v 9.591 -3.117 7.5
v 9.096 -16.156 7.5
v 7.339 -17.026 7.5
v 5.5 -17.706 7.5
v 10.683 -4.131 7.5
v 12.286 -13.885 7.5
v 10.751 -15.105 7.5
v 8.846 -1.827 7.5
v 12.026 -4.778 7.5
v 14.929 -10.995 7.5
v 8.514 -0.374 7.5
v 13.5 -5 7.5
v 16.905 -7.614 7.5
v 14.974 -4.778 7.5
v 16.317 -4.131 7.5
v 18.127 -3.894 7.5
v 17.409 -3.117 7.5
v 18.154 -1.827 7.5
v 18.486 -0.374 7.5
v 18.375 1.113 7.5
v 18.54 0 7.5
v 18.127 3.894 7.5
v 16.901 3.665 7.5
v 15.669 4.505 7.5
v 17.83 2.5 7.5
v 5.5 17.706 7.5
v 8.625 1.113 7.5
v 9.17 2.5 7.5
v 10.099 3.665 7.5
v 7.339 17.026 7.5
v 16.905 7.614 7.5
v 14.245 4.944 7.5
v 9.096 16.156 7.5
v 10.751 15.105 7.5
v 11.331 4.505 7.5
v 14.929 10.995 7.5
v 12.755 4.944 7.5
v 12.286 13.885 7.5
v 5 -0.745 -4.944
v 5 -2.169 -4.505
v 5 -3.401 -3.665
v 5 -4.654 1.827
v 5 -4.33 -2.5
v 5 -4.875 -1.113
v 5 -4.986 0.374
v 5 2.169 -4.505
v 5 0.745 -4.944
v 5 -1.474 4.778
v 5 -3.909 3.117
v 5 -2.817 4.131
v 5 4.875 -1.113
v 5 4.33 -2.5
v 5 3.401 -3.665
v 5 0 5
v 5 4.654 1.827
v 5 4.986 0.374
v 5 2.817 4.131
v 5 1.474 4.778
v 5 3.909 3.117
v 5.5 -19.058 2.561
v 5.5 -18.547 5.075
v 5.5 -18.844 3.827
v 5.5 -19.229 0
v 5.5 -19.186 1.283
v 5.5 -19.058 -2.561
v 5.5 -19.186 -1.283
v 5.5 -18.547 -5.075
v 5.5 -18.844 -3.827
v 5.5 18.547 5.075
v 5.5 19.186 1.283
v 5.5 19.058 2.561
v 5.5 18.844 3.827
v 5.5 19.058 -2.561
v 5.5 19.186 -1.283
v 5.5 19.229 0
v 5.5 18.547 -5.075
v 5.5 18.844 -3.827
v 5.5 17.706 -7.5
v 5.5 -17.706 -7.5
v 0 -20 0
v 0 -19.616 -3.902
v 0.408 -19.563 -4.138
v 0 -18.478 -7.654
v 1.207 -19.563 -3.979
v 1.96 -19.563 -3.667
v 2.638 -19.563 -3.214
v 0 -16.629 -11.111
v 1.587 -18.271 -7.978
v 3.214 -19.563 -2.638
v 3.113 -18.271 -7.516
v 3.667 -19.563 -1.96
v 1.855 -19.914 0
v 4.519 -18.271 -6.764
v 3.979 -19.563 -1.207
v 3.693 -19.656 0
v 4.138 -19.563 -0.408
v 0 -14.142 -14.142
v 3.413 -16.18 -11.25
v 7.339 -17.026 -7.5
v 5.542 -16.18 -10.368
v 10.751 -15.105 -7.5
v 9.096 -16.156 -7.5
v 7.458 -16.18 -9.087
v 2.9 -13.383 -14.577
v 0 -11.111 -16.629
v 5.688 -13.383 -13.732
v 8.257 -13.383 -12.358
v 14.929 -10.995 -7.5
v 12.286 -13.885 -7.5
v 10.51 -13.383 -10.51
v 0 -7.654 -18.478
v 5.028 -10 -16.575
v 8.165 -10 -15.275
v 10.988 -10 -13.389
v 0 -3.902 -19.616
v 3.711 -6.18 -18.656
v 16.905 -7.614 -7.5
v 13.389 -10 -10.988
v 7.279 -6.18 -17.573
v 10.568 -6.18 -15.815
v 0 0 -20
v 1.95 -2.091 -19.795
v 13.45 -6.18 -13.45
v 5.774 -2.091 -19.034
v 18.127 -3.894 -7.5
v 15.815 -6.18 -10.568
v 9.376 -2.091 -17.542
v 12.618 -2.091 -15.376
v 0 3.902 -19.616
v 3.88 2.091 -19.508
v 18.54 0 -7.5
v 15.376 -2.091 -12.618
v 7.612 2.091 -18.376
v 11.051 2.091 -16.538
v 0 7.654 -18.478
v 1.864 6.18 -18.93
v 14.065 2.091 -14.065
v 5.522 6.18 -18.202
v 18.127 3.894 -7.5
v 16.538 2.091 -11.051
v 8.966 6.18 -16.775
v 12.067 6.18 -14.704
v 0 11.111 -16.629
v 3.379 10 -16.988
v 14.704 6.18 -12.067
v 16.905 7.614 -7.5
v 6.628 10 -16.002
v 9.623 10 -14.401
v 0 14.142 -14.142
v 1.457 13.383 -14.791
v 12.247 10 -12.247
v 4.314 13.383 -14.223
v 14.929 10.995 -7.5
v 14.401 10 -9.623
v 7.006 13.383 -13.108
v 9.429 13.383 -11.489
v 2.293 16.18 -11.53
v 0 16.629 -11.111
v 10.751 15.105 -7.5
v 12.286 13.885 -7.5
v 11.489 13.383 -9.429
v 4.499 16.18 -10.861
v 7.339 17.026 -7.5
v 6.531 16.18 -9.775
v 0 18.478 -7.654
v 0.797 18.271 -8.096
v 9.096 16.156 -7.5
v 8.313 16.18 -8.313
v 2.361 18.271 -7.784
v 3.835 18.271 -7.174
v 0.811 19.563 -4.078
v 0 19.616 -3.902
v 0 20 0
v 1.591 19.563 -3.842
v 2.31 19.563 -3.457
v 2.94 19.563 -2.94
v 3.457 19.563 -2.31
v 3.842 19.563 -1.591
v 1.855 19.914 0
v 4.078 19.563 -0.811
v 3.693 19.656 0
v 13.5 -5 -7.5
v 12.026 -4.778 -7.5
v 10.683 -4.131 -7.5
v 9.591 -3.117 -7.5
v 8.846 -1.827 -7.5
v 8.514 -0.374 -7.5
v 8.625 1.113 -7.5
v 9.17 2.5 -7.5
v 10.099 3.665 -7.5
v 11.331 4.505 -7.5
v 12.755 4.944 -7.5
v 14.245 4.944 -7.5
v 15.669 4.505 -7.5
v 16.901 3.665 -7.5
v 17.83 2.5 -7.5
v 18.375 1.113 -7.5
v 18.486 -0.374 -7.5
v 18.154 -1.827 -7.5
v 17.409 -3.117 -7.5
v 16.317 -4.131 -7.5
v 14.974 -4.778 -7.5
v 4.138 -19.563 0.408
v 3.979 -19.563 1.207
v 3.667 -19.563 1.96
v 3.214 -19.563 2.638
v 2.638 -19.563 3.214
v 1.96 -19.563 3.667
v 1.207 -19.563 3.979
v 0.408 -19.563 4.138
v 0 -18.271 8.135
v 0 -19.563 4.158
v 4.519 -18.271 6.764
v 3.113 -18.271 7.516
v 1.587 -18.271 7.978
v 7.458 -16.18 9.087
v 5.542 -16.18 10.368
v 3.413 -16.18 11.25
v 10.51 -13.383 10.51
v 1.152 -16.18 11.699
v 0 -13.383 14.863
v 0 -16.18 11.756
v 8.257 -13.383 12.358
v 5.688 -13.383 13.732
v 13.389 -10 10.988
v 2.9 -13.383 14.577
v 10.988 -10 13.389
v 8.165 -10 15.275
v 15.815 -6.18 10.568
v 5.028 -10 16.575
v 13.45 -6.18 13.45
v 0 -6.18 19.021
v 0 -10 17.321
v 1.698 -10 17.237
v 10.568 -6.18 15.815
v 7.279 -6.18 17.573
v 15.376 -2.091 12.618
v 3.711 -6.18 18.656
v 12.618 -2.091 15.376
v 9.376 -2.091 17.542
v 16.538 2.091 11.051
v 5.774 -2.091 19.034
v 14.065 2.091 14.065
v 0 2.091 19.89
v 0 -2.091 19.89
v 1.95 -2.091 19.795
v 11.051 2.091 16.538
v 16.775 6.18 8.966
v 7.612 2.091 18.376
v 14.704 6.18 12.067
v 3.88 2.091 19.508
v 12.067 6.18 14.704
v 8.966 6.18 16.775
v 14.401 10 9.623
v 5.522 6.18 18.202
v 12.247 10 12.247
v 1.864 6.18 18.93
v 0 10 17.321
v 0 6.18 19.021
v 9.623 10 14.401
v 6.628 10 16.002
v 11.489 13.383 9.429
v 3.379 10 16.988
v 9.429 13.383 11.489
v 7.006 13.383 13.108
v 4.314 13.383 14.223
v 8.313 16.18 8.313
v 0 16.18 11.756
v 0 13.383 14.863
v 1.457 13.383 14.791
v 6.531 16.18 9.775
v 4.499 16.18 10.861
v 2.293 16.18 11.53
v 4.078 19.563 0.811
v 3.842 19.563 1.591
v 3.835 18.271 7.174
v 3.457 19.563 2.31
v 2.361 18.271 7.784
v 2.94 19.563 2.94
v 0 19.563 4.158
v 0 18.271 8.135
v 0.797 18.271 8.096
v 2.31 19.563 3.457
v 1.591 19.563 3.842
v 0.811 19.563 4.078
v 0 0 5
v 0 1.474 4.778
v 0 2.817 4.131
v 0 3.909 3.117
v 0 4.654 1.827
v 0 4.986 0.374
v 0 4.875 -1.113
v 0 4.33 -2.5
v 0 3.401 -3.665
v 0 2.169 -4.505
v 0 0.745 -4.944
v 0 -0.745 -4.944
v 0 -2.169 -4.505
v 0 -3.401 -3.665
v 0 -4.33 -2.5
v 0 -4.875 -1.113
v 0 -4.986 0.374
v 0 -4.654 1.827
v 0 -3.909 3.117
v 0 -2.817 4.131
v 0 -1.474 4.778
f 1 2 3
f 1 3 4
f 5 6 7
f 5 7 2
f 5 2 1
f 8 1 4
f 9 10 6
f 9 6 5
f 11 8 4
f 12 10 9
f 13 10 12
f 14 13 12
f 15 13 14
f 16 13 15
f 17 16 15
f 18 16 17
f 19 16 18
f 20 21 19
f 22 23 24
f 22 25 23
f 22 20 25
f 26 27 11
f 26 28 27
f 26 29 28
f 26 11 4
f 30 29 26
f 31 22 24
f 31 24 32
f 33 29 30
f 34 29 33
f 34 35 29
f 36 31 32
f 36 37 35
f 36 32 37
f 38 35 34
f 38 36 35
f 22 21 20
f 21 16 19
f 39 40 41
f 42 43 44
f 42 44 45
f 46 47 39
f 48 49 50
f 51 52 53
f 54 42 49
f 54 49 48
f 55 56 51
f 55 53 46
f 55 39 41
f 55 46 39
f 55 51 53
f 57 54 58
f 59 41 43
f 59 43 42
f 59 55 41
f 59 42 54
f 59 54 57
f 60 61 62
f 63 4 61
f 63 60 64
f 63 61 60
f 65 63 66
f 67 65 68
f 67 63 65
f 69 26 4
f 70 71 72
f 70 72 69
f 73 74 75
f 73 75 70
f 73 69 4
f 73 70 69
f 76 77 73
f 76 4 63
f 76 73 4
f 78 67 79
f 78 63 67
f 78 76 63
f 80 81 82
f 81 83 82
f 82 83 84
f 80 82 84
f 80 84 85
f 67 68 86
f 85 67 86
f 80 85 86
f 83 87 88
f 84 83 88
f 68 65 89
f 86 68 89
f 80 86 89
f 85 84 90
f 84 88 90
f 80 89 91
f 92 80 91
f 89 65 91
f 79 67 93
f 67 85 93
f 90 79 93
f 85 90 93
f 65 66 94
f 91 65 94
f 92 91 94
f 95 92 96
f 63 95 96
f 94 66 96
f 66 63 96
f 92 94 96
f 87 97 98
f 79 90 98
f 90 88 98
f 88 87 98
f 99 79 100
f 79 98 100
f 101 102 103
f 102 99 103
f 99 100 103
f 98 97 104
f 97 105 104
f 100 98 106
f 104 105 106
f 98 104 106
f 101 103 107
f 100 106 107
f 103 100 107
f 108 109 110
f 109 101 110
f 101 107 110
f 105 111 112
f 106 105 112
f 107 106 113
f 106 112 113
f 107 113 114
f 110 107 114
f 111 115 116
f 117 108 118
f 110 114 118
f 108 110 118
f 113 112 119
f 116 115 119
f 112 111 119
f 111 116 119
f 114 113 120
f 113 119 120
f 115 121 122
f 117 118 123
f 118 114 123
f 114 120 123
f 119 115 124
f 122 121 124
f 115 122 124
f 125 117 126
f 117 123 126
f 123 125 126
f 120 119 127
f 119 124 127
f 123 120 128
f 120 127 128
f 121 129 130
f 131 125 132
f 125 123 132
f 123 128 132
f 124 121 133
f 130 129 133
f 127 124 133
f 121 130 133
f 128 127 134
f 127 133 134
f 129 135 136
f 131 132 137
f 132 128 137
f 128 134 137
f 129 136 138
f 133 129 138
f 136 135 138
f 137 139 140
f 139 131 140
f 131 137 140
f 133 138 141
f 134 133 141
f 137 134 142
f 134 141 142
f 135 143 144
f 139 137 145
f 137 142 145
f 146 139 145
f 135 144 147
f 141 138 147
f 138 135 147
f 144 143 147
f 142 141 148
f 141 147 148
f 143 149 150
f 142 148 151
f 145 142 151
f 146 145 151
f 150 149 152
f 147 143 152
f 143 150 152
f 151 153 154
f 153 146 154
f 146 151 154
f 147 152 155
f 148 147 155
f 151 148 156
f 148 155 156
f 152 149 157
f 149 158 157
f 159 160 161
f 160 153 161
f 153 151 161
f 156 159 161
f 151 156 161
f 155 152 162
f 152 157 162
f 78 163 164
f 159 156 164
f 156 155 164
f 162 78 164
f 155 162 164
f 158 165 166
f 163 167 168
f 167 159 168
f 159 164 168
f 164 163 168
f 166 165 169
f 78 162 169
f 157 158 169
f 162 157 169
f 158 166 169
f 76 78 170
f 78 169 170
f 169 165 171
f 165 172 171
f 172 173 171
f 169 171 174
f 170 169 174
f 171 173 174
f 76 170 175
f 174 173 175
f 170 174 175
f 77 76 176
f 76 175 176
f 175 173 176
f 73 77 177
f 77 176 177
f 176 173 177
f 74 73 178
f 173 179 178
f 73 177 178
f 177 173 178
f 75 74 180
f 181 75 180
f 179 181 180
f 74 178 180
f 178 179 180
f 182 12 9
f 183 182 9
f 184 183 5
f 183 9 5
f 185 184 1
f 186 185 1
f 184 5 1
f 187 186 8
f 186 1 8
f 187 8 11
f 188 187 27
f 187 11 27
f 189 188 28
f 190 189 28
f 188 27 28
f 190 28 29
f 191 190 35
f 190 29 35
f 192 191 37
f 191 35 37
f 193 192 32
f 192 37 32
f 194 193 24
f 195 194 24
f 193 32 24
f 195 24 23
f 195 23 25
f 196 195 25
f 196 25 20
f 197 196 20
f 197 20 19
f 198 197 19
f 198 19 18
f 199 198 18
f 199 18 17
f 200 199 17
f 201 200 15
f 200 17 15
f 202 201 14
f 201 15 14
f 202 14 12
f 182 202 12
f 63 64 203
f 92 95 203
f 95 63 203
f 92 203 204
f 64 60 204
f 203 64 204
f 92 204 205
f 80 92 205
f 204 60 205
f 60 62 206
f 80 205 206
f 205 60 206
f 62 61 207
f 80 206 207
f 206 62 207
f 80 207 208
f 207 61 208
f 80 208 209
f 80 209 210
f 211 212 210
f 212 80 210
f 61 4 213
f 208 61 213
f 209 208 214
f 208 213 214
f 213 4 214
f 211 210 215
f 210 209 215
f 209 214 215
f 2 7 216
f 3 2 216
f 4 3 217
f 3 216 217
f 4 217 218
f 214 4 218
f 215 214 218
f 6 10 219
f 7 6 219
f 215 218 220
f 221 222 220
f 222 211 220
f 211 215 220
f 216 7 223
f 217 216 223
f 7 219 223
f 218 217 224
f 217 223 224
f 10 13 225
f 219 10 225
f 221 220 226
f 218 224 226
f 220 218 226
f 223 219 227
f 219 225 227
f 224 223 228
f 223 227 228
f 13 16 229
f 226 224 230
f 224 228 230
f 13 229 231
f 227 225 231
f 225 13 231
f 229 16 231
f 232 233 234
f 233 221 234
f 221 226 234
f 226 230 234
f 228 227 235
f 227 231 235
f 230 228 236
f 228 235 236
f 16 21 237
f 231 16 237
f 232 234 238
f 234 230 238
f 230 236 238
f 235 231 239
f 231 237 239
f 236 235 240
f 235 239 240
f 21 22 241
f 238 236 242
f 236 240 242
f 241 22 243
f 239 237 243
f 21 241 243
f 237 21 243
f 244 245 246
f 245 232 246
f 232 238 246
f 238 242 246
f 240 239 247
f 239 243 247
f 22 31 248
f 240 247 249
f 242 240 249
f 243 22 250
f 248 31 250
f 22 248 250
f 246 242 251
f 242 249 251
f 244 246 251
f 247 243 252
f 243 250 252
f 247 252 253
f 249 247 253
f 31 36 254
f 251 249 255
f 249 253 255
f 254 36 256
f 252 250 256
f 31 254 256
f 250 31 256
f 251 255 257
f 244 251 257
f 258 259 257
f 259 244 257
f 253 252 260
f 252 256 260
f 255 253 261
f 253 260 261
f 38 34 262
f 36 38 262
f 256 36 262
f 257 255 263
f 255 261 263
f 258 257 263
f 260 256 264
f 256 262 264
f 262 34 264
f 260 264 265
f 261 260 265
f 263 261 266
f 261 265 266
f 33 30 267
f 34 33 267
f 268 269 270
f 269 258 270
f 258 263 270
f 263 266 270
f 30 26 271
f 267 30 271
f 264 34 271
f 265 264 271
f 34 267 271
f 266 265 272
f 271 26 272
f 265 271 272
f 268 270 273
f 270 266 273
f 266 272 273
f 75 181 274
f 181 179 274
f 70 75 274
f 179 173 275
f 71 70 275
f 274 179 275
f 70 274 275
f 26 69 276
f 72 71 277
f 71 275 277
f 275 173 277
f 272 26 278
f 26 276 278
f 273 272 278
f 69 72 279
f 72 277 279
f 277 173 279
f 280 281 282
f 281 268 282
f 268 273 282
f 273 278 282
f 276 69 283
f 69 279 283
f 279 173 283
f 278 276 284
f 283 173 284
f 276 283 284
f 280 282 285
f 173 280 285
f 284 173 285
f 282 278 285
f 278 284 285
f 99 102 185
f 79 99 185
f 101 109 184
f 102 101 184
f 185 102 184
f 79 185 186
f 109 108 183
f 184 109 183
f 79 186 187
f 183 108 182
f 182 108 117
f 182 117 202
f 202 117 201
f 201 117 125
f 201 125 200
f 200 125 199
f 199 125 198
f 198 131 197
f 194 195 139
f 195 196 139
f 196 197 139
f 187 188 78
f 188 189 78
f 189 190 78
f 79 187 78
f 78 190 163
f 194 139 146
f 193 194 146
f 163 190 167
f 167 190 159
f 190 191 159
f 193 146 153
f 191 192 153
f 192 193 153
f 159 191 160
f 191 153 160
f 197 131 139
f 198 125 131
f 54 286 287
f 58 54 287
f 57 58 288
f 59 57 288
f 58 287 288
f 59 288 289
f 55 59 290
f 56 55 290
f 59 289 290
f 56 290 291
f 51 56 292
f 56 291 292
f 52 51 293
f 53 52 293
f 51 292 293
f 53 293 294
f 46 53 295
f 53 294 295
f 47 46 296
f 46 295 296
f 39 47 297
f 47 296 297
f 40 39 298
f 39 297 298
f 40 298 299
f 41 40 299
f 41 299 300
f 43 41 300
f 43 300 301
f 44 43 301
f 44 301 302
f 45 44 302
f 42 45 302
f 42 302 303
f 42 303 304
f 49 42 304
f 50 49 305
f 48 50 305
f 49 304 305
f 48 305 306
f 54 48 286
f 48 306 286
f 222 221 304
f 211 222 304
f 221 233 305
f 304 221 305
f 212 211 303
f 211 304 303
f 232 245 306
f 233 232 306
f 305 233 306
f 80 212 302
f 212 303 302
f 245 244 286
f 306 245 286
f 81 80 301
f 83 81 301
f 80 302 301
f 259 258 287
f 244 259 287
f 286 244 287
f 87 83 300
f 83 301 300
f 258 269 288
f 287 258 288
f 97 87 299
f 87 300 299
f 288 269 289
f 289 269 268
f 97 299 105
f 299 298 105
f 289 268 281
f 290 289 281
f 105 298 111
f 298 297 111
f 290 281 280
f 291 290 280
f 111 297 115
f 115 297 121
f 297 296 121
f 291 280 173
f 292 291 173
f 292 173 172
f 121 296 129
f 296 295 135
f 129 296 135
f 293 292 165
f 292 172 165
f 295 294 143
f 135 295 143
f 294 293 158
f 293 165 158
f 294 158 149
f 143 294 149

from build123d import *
from build123d.topology import SkipClean

# Parameters (mm, degrees)
SKETCH2_R           = 20
CUT_EXTRUDE1_DEPTH  = 30
SKETCH9_W           = 15
SKETCH9_H           = 41
CUT_EXTRUDE4_DEPTH  = 14.5
SKETCH10_R          = 5
BOSS_EXTRUDE2_DEPTH = 15
SKETCH11_R          = 5
CUT_EXTRUDE5_DEPTH  = 5


with BuildPart() as part:
    # Sketch3 → Revolve1 (revolve)
    with BuildSketch(Plane.XY):
        with BuildLine():
            Line((0, 20), (0, -20))
            ThreePointArc((0, -20), (20, 0), (0, 20))
        make_face()
    revolve(axis=Axis((0, 20, 0), (0, -1, 0)))

    # Sketch2 → Cut-Extrude1 (cut)
    with SkipClean():  # the faces are left unmerged after this step: merging them gives an invalid solid
        with BuildSketch(Plane(origin=(0, 0, 0), x_dir=(0, 0, -1), z_dir=(1, 0, 0))):
            Circle(SKETCH2_R)
        extrude(amount=-CUT_EXTRUDE1_DEPTH, mode=Mode.SUBTRACT)

    # Sketch9 → Cut-Extrude4 (cut)
    with SkipClean():  # the faces are left unmerged after this step: merging them gives an invalid solid
        with BuildSketch(Plane(origin=(20, 0, 0), x_dir=(0, 0, -1), z_dir=(1, 0, 0))):
            Rectangle(SKETCH9_W, SKETCH9_H)
        extrude(amount=-CUT_EXTRUDE4_DEPTH, mode=Mode.SUBTRACT)

    # Sketch10 → Boss-Extrude2 (add)
    with SkipClean():  # the faces are left unmerged after this step: merging them gives an invalid solid
        with BuildSketch(Plane(origin=(0, 0, 7.5), x_dir=(-1, 0, 0), z_dir=(0, 0, -1))):
            with Locations(Location((-13.5, 0, 0), (0, 0, 270))):
                Circle(SKETCH10_R)
        extrude(amount=BOSS_EXTRUDE2_DEPTH)

    # Sketch11 → Cut-Extrude5 (cut)
    with SkipClean():  # the faces are left unmerged after this step: merging them gives an invalid solid
        with BuildSketch(Plane.ZY):
            Circle(SKETCH11_R)
        extrude(amount=-CUT_EXTRUDE5_DEPTH, mode=Mode.SUBTRACT)


solid = part.part
